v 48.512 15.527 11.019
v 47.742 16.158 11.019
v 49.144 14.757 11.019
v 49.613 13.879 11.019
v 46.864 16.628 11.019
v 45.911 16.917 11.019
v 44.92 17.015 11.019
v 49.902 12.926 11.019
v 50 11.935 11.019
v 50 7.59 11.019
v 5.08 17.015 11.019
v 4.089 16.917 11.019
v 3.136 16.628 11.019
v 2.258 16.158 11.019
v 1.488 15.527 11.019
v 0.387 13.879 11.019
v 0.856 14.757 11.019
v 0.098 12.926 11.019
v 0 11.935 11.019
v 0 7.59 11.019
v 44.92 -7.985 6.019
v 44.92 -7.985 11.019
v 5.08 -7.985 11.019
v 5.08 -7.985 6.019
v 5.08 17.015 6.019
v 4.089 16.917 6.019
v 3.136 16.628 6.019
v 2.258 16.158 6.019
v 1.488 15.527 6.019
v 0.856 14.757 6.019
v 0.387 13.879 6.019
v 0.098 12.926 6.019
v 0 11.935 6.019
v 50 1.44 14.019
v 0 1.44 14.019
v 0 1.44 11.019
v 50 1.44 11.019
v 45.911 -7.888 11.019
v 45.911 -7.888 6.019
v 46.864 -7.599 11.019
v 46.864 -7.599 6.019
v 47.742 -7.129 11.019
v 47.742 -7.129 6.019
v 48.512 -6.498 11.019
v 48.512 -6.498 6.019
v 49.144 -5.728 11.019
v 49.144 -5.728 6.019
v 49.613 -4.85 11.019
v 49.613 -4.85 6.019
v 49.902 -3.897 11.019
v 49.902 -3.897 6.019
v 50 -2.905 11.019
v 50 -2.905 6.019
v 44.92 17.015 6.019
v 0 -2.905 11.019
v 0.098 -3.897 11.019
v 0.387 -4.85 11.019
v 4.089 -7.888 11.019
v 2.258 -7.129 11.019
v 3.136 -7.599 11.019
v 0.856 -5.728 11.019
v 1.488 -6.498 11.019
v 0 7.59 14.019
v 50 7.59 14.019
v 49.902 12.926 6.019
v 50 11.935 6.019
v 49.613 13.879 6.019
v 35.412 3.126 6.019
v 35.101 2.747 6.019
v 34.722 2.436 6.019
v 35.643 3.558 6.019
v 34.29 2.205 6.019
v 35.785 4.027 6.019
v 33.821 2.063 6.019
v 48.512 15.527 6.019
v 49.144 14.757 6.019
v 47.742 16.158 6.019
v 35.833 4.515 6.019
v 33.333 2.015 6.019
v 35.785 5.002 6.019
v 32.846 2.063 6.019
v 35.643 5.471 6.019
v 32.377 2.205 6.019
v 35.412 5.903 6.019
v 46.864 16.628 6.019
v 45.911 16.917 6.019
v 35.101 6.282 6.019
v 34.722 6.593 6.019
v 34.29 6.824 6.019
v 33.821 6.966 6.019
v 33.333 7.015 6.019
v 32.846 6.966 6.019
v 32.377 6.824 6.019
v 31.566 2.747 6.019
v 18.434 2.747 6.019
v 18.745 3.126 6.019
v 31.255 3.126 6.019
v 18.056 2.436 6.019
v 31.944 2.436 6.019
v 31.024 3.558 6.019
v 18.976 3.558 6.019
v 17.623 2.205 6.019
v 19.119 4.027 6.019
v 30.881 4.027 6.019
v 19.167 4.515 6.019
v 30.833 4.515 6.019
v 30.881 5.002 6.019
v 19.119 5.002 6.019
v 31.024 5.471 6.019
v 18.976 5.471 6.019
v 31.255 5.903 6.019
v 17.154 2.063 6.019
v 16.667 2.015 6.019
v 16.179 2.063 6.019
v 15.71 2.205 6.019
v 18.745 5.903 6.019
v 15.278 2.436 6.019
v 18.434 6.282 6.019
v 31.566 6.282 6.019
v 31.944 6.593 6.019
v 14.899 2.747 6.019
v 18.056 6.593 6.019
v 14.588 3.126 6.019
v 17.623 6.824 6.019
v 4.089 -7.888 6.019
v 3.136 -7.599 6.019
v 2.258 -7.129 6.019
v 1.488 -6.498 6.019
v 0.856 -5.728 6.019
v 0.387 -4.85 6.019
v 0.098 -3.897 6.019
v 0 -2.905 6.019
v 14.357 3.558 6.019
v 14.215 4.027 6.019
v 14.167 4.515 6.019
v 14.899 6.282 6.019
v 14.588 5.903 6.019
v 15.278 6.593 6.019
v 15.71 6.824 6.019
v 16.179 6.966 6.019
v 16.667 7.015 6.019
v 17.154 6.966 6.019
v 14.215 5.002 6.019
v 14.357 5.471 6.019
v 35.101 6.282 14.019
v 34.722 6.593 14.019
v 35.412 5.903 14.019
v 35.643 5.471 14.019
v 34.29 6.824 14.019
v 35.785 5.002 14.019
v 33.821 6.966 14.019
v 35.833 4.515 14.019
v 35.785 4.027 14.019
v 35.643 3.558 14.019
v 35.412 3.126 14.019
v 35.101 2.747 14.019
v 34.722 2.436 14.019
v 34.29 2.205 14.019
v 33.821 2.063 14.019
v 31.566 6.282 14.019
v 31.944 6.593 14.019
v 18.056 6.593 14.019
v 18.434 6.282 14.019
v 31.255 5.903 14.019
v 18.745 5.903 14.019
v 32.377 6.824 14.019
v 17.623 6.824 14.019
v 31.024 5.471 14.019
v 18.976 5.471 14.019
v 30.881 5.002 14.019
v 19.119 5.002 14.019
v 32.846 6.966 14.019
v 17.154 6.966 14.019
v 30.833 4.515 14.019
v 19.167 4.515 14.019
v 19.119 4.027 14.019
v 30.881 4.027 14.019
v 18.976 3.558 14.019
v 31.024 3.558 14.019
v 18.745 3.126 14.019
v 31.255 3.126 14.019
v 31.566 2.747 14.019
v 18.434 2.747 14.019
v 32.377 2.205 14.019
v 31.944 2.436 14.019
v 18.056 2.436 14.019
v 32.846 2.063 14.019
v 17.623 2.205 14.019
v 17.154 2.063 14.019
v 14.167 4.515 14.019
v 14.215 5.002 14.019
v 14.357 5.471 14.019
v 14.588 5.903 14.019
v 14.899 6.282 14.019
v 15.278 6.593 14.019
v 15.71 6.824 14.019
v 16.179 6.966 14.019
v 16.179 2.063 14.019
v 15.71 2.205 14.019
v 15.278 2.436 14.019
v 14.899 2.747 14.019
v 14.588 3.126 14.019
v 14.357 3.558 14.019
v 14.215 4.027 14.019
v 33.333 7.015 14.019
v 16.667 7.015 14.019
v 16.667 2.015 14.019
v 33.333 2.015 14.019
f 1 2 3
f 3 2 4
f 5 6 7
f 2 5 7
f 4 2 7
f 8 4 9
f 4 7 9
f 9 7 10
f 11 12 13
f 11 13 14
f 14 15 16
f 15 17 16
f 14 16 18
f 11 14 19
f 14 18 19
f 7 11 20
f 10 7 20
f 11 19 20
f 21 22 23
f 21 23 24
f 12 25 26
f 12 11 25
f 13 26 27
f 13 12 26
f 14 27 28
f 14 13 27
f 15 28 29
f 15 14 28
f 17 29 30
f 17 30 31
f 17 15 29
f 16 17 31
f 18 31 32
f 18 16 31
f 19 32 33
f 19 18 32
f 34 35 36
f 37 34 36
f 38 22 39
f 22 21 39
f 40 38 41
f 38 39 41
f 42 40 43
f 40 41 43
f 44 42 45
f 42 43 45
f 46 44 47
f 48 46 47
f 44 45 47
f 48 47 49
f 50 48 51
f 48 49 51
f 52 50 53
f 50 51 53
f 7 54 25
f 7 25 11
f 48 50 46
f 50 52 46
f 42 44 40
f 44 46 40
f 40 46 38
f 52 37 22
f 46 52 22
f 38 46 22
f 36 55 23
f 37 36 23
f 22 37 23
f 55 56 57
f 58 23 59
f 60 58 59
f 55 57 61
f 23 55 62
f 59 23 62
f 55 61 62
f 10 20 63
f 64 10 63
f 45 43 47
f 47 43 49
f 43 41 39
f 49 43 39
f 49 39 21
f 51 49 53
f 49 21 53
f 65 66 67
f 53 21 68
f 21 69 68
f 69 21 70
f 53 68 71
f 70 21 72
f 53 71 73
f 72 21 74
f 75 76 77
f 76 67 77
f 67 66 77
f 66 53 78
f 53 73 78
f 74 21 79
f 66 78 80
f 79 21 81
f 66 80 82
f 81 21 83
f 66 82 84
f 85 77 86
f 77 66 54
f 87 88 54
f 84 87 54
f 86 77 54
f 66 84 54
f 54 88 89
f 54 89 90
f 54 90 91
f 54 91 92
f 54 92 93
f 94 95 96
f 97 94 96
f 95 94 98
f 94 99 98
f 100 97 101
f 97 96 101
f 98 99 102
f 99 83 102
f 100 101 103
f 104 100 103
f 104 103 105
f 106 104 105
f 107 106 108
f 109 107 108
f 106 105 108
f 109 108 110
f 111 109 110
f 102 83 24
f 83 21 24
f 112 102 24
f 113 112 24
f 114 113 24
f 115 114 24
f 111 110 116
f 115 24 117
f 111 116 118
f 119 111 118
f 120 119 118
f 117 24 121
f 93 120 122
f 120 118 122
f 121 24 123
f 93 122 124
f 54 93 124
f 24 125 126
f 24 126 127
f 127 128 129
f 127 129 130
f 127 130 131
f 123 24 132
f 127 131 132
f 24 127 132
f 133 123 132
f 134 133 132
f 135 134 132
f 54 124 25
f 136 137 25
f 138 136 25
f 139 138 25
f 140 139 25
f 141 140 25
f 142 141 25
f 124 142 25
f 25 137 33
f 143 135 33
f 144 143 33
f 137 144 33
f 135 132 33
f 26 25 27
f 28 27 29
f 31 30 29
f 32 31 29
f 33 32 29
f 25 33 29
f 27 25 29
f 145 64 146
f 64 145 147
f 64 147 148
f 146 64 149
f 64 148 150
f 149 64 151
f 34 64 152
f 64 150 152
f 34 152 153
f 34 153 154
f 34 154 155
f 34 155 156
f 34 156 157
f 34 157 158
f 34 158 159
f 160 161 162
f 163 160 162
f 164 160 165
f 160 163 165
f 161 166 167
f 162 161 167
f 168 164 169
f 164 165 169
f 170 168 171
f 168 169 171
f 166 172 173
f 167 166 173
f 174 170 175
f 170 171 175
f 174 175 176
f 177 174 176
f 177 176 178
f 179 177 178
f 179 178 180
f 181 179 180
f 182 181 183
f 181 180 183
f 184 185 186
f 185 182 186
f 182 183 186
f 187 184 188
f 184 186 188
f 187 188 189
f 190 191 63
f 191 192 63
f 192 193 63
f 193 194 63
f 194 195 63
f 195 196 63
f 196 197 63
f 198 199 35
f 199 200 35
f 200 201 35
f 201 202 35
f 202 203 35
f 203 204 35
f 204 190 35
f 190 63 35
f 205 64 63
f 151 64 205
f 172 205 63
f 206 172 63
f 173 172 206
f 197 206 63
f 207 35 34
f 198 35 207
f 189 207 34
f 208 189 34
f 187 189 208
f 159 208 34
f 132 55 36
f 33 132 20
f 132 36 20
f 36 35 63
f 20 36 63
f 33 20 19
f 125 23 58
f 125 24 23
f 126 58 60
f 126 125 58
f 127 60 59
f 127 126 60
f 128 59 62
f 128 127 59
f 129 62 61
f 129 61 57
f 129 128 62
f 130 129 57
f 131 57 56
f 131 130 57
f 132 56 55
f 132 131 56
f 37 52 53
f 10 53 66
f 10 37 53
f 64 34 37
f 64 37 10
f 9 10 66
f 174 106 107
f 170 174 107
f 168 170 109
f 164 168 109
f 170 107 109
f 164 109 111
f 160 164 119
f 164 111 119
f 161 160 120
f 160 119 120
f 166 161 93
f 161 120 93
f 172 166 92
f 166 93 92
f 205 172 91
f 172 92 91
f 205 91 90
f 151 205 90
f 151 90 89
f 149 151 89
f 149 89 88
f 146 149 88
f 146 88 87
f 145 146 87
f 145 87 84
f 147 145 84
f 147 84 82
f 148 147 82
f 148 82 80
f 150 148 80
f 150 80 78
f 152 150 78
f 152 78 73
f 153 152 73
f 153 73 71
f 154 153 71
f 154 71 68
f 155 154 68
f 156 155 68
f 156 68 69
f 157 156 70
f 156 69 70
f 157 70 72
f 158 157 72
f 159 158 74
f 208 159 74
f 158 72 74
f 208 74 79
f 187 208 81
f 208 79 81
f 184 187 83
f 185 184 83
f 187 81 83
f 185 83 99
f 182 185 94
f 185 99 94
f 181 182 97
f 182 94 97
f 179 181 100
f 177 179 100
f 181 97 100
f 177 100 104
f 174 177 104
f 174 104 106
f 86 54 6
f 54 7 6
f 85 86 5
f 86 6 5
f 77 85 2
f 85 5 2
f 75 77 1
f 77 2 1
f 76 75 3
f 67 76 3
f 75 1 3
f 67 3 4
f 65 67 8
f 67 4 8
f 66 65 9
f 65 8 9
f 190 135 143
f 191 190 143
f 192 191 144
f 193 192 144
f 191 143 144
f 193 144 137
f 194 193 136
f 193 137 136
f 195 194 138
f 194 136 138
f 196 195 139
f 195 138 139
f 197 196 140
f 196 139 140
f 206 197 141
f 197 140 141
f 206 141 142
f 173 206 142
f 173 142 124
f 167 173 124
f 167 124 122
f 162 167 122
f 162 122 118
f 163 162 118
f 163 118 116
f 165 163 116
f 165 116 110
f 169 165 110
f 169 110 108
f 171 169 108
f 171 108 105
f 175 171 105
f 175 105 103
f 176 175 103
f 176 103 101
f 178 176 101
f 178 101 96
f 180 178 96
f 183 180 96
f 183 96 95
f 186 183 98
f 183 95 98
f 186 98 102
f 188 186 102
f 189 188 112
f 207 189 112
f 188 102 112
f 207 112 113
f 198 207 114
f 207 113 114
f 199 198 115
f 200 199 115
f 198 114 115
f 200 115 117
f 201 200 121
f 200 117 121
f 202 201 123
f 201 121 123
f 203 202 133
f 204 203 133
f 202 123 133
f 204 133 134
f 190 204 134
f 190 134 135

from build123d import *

# Parameters (mm, degrees)
F1_DEPTH = 50
F2_R     = 5.08
F4_D     = 5


with BuildPart() as f1:
    # F0 (on Right) → F1 (new body)
    with BuildSketch(Plane.YZ):
        Polygon((1.439528, 14.019234), (1.439528, 11.019234), (-7.985472, 11.019234), (-7.985472, 6.019234), (17.014528, 6.019234), (17.014528, 11.019234), (7.589528, 11.019234), (7.589528, 14.019234), align=None)
    extrude(amount=F1_DEPTH)

    # F2
    f2_edges = [f1.edges().sort_by_distance(p)[0] for p in [
        (50, 17.014528, 8.519234),
        (50, -7.985472, 8.519234),
        (0, 17.014528, 8.519234),
        (0, -7.985472, 8.519234),
    ]]
    fillet(f2_edges, radius=F2_R)

    # F4 (through all)
    with Locations(Plane.XY.offset(14.019234)):
        with Locations((16.666667, 4.514528), (33.333333, 4.514528)):
            Hole(F4_D / 2)


solid = f1.part
